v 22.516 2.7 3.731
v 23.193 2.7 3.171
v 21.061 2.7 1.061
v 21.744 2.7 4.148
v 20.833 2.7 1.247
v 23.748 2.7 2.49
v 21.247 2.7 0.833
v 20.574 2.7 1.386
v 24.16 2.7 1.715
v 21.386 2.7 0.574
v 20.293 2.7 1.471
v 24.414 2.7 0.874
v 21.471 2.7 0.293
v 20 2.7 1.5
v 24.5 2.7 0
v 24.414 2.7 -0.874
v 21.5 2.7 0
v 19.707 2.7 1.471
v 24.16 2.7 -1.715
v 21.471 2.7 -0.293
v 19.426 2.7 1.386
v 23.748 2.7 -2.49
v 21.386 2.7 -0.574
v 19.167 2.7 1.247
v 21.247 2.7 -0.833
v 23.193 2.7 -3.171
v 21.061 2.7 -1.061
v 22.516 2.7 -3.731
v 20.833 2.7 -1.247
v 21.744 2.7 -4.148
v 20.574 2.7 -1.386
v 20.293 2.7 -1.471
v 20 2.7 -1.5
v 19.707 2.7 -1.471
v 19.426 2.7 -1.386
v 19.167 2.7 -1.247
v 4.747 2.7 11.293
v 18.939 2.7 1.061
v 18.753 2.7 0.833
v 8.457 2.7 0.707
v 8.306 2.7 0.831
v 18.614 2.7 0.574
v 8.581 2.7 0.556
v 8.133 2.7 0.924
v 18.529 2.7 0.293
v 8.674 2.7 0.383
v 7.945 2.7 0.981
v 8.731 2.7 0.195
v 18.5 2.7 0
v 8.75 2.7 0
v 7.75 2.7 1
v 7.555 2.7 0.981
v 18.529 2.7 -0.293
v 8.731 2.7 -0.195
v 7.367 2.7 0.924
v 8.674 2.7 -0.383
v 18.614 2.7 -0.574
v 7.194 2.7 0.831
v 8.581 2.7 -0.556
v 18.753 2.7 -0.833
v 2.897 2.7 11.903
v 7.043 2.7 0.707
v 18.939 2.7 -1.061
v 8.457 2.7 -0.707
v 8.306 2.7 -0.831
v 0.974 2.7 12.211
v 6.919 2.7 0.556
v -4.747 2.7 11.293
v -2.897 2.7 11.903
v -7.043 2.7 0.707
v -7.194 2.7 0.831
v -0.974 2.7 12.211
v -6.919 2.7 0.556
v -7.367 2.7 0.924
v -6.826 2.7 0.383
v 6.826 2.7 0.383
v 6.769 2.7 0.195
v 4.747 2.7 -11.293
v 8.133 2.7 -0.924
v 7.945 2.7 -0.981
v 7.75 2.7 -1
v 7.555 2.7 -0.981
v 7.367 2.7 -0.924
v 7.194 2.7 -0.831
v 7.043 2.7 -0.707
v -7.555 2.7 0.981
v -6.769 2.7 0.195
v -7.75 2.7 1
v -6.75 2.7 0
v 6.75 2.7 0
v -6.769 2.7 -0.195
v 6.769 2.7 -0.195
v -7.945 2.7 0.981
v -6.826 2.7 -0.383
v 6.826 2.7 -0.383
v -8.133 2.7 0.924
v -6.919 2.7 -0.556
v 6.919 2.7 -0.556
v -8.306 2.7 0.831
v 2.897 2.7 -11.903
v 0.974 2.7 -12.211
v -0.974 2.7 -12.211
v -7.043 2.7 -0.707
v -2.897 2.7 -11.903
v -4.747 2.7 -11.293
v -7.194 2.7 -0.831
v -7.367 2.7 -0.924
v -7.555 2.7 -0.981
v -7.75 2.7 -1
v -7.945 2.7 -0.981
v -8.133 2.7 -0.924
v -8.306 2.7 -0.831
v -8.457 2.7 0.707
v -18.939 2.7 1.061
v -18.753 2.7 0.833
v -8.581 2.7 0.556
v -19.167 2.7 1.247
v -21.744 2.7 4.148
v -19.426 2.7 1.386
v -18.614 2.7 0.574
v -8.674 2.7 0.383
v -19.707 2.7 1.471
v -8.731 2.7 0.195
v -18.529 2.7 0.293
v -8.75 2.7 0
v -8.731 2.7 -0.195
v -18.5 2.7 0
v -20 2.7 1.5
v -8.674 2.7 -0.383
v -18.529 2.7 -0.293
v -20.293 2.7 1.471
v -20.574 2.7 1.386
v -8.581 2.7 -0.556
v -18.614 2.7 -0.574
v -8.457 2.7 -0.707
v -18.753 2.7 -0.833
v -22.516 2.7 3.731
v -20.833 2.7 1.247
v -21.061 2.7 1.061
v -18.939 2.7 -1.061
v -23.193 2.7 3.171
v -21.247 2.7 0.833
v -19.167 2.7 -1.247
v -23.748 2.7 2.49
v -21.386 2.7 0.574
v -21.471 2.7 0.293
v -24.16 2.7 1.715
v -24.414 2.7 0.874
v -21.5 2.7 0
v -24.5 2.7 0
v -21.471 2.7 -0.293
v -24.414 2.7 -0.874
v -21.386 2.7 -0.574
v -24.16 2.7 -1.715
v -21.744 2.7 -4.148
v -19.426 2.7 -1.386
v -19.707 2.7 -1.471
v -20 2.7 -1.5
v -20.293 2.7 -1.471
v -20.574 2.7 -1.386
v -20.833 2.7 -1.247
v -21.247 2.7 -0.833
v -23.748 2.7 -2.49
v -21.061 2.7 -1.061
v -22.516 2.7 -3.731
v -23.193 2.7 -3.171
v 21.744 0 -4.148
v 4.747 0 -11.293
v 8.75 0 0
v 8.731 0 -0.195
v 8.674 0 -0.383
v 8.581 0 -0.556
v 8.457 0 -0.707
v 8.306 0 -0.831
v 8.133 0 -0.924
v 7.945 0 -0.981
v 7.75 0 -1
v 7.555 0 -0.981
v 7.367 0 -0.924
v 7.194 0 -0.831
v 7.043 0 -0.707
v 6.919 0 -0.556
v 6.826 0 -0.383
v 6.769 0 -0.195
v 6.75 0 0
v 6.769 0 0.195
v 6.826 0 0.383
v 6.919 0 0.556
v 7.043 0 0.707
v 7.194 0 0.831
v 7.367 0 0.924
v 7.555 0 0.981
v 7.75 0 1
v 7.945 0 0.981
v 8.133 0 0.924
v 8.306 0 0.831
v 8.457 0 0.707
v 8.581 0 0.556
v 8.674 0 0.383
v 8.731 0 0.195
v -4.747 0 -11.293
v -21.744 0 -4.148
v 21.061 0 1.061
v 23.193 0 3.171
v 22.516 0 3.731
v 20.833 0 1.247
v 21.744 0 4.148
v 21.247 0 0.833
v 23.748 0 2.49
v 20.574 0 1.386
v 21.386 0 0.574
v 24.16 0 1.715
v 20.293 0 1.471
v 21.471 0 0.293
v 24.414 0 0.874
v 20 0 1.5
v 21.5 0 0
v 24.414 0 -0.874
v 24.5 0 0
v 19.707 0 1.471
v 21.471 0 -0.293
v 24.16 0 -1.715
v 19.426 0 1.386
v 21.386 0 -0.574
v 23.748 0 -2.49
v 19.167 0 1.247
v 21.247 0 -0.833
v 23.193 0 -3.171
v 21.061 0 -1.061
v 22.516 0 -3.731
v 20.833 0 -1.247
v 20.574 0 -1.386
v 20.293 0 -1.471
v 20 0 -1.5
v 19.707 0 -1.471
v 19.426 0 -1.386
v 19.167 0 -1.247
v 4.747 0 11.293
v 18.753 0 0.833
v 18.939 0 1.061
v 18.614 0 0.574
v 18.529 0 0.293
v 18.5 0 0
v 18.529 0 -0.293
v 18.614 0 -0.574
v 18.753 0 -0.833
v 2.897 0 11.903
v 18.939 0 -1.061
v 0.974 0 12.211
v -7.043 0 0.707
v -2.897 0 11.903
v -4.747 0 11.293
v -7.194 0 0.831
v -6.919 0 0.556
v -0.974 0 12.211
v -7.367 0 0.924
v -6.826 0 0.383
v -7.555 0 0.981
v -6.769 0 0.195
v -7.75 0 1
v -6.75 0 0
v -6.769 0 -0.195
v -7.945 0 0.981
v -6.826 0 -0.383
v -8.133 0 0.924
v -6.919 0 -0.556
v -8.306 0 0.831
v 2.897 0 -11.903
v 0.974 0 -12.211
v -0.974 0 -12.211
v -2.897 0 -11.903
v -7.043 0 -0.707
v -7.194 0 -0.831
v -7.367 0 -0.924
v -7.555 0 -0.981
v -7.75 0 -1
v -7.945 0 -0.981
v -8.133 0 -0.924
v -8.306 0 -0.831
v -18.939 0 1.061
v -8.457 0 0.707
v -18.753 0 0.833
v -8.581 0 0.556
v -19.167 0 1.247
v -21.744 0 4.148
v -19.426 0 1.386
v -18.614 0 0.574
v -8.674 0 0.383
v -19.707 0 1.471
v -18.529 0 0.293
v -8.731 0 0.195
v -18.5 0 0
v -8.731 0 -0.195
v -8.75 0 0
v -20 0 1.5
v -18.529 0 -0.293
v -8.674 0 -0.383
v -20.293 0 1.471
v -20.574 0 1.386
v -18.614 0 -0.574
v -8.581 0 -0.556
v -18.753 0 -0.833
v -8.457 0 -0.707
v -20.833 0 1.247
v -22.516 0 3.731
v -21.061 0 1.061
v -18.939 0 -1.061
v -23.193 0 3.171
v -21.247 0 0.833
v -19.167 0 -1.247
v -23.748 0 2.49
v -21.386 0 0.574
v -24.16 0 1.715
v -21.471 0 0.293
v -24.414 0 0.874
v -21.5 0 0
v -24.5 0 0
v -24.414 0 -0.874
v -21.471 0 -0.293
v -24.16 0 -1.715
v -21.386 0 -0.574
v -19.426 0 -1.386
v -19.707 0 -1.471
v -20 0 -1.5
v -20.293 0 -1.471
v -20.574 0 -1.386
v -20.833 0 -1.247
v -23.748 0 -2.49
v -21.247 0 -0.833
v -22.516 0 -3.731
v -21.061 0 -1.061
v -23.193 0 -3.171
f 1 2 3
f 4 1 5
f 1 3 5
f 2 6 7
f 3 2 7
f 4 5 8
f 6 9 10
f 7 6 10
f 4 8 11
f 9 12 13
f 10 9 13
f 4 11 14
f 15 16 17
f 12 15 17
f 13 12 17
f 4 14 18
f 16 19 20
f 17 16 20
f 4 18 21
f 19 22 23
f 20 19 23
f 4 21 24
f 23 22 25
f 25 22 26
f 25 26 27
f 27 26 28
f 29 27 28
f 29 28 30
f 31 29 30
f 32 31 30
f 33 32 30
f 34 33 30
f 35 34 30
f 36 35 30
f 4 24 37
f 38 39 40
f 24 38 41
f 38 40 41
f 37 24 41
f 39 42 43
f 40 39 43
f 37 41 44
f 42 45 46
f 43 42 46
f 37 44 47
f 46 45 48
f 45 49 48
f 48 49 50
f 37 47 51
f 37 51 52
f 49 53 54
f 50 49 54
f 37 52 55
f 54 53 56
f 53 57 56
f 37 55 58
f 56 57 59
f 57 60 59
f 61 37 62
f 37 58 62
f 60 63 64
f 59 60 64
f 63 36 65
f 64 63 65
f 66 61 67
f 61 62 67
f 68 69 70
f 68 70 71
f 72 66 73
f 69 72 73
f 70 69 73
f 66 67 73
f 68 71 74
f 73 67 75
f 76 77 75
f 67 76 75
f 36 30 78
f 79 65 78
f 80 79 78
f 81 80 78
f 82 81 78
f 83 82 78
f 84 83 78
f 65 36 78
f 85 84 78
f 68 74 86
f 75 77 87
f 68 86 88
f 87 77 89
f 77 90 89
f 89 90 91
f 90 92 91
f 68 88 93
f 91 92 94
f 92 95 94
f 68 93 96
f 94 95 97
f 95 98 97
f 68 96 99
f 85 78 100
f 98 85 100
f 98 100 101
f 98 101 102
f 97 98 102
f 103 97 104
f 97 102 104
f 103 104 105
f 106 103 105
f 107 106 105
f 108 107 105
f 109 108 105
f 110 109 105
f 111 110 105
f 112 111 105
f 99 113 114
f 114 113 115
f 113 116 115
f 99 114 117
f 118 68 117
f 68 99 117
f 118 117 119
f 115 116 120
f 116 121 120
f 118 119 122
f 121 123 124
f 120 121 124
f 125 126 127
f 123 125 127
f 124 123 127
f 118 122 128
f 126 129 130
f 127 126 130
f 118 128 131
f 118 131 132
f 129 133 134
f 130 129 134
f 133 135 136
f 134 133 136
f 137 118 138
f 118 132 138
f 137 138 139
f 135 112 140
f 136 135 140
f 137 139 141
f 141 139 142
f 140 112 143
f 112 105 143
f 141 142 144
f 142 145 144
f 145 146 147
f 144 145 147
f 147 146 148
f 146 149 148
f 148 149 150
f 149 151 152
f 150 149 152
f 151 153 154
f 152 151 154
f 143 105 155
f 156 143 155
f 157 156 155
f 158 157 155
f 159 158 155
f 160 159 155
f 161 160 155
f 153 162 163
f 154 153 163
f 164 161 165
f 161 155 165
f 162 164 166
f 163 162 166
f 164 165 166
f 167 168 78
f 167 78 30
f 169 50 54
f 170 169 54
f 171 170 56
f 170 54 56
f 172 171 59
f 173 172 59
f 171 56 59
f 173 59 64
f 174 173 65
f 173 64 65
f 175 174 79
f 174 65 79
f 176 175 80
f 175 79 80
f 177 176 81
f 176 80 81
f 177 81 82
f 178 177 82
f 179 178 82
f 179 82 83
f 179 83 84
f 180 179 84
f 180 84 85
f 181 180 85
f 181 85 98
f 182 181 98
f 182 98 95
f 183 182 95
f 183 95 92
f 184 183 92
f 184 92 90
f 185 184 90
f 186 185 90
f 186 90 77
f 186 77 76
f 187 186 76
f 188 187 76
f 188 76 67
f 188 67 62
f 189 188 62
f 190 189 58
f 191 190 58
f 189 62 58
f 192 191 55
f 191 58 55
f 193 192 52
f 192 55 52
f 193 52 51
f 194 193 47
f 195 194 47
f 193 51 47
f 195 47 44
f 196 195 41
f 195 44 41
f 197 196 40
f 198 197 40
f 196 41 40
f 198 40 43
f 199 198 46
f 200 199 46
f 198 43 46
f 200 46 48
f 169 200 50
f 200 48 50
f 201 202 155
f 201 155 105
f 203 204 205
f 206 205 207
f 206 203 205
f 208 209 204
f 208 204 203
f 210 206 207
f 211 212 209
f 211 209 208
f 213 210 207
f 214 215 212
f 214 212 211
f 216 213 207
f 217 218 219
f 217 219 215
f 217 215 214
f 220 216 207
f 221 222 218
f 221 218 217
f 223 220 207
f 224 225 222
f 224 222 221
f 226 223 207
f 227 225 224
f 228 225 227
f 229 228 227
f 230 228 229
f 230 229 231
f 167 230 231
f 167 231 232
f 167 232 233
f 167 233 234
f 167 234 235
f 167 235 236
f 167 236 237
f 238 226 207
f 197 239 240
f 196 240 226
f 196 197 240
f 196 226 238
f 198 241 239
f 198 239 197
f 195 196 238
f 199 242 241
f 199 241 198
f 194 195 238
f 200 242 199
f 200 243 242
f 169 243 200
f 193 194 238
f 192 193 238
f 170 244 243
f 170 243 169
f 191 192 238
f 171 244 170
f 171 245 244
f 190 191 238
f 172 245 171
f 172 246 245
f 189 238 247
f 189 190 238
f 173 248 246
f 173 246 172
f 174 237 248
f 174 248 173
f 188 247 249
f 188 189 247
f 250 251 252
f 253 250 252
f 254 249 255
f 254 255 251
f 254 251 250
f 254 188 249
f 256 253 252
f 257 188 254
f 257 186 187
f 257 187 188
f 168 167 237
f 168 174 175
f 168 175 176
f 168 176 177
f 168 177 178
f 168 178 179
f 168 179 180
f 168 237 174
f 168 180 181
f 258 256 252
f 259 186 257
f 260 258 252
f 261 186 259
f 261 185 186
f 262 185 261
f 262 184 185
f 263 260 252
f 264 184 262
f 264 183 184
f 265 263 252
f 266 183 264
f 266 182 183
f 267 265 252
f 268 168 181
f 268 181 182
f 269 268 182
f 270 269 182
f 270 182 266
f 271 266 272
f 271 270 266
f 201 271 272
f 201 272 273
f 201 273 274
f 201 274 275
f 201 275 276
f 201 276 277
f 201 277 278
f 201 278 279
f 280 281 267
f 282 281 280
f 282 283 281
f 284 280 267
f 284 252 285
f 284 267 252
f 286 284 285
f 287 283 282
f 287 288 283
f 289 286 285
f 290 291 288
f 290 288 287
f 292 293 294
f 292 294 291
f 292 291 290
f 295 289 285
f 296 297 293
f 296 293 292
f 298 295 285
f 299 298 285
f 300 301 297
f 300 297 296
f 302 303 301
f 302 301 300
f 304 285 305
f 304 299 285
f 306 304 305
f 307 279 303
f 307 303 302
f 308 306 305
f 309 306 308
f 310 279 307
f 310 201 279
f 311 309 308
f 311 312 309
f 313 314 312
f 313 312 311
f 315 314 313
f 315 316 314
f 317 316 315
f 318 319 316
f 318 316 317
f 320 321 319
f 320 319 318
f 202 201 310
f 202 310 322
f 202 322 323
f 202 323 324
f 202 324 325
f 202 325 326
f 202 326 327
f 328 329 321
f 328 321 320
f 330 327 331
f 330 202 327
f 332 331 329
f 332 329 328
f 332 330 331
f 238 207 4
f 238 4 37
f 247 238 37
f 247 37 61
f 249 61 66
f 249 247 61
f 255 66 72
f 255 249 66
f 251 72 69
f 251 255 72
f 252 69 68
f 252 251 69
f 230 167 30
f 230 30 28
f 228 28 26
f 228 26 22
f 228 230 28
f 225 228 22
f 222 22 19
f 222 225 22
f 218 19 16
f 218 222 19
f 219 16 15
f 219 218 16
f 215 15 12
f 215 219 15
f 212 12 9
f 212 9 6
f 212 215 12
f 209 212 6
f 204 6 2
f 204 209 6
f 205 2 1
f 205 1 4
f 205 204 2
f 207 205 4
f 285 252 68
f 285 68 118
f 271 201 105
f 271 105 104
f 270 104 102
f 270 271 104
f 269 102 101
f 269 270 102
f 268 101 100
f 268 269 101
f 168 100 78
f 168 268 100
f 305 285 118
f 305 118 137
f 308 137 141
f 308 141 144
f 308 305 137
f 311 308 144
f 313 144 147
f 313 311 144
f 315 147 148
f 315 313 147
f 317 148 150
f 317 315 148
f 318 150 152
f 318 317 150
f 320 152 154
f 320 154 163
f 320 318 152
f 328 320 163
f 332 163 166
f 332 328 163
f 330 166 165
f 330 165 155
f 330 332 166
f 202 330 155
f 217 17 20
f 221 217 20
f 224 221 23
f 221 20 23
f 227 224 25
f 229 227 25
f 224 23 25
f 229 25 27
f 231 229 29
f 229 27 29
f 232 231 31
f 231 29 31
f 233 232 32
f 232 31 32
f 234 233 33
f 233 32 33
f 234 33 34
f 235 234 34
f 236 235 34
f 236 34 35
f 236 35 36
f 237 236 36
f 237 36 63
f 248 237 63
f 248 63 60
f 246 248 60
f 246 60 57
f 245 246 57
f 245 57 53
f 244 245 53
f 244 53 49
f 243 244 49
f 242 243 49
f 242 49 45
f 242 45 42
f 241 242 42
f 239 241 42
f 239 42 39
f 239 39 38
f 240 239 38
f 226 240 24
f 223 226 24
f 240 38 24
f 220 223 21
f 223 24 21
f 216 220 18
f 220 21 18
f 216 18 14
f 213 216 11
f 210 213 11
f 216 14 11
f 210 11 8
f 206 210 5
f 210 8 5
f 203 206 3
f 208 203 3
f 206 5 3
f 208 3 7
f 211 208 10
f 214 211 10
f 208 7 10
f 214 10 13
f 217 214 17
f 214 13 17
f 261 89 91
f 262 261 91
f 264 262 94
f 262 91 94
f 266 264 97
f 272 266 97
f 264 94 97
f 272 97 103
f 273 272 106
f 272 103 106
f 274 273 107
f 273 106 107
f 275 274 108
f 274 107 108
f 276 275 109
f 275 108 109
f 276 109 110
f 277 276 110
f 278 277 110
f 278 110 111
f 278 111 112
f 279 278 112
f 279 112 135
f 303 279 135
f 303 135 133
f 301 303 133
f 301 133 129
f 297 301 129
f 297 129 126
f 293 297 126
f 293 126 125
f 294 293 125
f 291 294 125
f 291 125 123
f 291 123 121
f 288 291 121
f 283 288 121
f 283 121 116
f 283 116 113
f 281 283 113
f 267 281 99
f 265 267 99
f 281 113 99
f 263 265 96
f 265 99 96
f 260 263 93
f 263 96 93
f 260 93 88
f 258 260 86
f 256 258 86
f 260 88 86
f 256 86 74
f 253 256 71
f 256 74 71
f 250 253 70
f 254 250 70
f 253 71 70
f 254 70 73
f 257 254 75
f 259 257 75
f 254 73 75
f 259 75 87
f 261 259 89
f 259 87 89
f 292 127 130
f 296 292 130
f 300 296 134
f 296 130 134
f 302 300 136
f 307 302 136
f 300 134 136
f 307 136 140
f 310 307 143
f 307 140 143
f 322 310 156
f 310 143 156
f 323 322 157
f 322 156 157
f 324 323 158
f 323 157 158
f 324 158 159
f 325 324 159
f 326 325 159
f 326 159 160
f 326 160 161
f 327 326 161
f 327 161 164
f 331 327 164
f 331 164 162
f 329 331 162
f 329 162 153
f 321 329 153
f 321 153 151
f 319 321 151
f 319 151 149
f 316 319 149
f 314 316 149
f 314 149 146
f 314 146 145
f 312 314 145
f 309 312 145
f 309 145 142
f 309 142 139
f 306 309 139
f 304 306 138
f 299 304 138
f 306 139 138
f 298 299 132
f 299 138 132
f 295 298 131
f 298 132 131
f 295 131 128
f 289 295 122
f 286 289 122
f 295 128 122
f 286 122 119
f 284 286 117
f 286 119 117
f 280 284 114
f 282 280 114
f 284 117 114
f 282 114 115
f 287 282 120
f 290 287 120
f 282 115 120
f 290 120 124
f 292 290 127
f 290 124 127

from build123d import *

# Parameters (mm, degrees)
BOSS_EXTRUDE1_DEPTH = 2.7
CUT_EXTRUDE1_REACH  = 4.7
SKETCH2_R           = 1.5
SKETCH2_R_2         = 1


with BuildPart() as part:
    # Sketch1 → Boss-Extrude1 (new body)
    with BuildSketch(Plane(origin=(0, 0, 0), x_dir=(1, 0, 0), z_dir=(0, 1, 0))):
        with BuildLine():
            Line((4.746875, 11.292903866), (21.74375, 4.148413665))
            ThreePointArc((21.74375, 4.148413665), (24.5, 0), (21.74375, -4.148413665))
            Line((21.74375, -4.148413665), (4.746875, -11.292903866))
            ThreePointArc((4.746875, -11.292903866), (0, -12.25), (-4.746875, -11.292903866))
            Line((-4.746875, -11.292903866), (-21.74375, -4.148413665))
            ThreePointArc((-21.74375, -4.148413665), (-24.5, 0), (-21.74375, 4.148413665))
            Line((-21.74375, 4.148413665), (-4.746875, 11.292903866))
            ThreePointArc((-4.746875, 11.292903866), (0, 12.25), (4.746875, 11.292903866))
        make_face()
    extrude(amount=BOSS_EXTRUDE1_DEPTH)

    # Sketch2 → Cut-Extrude1 (cut, up to next)
    with BuildSketch(Plane(origin=(0, 2.7, 0), x_dir=(1, 0, 0), z_dir=(0, 1, 0)), mode=Mode.PRIVATE) as cut_extrude1_sk1:
        with Locations((-20, 0)):
            Circle(SKETCH2_R)
    cut_extrude1_tool1 = extrude(cut_extrude1_sk1.sketch, amount=-CUT_EXTRUDE1_REACH, mode=Mode.PRIVATE) & part.part
    add(cut_extrude1_tool1.solids().sort_by_distance((-20, 2.7, 0))[0], mode=Mode.SUBTRACT)
    # Sketch2 → Cut-Extrude1 (cut, up to next)
    with BuildSketch(Plane(origin=(0, 2.7, 0), x_dir=(1, 0, 0), z_dir=(0, 1, 0)), mode=Mode.PRIVATE) as cut_extrude1_sk2:
        with Locations((20, 0)):
            Circle(SKETCH2_R)
    cut_extrude1_tool2 = extrude(cut_extrude1_sk2.sketch, amount=-CUT_EXTRUDE1_REACH, mode=Mode.PRIVATE) & part.part
    add(cut_extrude1_tool2.solids().sort_by_distance((20, 2.7, 0))[0], mode=Mode.SUBTRACT)
    # Sketch2 → Cut-Extrude1 (cut, up to next)
    with BuildSketch(Plane(origin=(0, 2.7, 0), x_dir=(1, 0, 0), z_dir=(0, 1, 0)), mode=Mode.PRIVATE) as cut_extrude1_sk3:
        with Locations((7.75, 0)):
            Circle(SKETCH2_R_2)
    cut_extrude1_tool3 = extrude(cut_extrude1_sk3.sketch, amount=-CUT_EXTRUDE1_REACH, mode=Mode.PRIVATE) & part.part
    add(cut_extrude1_tool3.solids().sort_by_distance((7.75, 2.7, 0))[0], mode=Mode.SUBTRACT)
    # Sketch2 → Cut-Extrude1 (cut, up to next)
    with BuildSketch(Plane(origin=(0, 2.7, 0), x_dir=(1, 0, 0), z_dir=(0, 1, 0)), mode=Mode.PRIVATE) as cut_extrude1_sk4:
        with Locations((-7.75, 0)):
            Circle(SKETCH2_R_2)
    cut_extrude1_tool4 = extrude(cut_extrude1_sk4.sketch, amount=-CUT_EXTRUDE1_REACH, mode=Mode.PRIVATE) & part.part
    add(cut_extrude1_tool4.solids().sort_by_distance((-7.75, 2.7, 0))[0], mode=Mode.SUBTRACT)


solid = part.part
